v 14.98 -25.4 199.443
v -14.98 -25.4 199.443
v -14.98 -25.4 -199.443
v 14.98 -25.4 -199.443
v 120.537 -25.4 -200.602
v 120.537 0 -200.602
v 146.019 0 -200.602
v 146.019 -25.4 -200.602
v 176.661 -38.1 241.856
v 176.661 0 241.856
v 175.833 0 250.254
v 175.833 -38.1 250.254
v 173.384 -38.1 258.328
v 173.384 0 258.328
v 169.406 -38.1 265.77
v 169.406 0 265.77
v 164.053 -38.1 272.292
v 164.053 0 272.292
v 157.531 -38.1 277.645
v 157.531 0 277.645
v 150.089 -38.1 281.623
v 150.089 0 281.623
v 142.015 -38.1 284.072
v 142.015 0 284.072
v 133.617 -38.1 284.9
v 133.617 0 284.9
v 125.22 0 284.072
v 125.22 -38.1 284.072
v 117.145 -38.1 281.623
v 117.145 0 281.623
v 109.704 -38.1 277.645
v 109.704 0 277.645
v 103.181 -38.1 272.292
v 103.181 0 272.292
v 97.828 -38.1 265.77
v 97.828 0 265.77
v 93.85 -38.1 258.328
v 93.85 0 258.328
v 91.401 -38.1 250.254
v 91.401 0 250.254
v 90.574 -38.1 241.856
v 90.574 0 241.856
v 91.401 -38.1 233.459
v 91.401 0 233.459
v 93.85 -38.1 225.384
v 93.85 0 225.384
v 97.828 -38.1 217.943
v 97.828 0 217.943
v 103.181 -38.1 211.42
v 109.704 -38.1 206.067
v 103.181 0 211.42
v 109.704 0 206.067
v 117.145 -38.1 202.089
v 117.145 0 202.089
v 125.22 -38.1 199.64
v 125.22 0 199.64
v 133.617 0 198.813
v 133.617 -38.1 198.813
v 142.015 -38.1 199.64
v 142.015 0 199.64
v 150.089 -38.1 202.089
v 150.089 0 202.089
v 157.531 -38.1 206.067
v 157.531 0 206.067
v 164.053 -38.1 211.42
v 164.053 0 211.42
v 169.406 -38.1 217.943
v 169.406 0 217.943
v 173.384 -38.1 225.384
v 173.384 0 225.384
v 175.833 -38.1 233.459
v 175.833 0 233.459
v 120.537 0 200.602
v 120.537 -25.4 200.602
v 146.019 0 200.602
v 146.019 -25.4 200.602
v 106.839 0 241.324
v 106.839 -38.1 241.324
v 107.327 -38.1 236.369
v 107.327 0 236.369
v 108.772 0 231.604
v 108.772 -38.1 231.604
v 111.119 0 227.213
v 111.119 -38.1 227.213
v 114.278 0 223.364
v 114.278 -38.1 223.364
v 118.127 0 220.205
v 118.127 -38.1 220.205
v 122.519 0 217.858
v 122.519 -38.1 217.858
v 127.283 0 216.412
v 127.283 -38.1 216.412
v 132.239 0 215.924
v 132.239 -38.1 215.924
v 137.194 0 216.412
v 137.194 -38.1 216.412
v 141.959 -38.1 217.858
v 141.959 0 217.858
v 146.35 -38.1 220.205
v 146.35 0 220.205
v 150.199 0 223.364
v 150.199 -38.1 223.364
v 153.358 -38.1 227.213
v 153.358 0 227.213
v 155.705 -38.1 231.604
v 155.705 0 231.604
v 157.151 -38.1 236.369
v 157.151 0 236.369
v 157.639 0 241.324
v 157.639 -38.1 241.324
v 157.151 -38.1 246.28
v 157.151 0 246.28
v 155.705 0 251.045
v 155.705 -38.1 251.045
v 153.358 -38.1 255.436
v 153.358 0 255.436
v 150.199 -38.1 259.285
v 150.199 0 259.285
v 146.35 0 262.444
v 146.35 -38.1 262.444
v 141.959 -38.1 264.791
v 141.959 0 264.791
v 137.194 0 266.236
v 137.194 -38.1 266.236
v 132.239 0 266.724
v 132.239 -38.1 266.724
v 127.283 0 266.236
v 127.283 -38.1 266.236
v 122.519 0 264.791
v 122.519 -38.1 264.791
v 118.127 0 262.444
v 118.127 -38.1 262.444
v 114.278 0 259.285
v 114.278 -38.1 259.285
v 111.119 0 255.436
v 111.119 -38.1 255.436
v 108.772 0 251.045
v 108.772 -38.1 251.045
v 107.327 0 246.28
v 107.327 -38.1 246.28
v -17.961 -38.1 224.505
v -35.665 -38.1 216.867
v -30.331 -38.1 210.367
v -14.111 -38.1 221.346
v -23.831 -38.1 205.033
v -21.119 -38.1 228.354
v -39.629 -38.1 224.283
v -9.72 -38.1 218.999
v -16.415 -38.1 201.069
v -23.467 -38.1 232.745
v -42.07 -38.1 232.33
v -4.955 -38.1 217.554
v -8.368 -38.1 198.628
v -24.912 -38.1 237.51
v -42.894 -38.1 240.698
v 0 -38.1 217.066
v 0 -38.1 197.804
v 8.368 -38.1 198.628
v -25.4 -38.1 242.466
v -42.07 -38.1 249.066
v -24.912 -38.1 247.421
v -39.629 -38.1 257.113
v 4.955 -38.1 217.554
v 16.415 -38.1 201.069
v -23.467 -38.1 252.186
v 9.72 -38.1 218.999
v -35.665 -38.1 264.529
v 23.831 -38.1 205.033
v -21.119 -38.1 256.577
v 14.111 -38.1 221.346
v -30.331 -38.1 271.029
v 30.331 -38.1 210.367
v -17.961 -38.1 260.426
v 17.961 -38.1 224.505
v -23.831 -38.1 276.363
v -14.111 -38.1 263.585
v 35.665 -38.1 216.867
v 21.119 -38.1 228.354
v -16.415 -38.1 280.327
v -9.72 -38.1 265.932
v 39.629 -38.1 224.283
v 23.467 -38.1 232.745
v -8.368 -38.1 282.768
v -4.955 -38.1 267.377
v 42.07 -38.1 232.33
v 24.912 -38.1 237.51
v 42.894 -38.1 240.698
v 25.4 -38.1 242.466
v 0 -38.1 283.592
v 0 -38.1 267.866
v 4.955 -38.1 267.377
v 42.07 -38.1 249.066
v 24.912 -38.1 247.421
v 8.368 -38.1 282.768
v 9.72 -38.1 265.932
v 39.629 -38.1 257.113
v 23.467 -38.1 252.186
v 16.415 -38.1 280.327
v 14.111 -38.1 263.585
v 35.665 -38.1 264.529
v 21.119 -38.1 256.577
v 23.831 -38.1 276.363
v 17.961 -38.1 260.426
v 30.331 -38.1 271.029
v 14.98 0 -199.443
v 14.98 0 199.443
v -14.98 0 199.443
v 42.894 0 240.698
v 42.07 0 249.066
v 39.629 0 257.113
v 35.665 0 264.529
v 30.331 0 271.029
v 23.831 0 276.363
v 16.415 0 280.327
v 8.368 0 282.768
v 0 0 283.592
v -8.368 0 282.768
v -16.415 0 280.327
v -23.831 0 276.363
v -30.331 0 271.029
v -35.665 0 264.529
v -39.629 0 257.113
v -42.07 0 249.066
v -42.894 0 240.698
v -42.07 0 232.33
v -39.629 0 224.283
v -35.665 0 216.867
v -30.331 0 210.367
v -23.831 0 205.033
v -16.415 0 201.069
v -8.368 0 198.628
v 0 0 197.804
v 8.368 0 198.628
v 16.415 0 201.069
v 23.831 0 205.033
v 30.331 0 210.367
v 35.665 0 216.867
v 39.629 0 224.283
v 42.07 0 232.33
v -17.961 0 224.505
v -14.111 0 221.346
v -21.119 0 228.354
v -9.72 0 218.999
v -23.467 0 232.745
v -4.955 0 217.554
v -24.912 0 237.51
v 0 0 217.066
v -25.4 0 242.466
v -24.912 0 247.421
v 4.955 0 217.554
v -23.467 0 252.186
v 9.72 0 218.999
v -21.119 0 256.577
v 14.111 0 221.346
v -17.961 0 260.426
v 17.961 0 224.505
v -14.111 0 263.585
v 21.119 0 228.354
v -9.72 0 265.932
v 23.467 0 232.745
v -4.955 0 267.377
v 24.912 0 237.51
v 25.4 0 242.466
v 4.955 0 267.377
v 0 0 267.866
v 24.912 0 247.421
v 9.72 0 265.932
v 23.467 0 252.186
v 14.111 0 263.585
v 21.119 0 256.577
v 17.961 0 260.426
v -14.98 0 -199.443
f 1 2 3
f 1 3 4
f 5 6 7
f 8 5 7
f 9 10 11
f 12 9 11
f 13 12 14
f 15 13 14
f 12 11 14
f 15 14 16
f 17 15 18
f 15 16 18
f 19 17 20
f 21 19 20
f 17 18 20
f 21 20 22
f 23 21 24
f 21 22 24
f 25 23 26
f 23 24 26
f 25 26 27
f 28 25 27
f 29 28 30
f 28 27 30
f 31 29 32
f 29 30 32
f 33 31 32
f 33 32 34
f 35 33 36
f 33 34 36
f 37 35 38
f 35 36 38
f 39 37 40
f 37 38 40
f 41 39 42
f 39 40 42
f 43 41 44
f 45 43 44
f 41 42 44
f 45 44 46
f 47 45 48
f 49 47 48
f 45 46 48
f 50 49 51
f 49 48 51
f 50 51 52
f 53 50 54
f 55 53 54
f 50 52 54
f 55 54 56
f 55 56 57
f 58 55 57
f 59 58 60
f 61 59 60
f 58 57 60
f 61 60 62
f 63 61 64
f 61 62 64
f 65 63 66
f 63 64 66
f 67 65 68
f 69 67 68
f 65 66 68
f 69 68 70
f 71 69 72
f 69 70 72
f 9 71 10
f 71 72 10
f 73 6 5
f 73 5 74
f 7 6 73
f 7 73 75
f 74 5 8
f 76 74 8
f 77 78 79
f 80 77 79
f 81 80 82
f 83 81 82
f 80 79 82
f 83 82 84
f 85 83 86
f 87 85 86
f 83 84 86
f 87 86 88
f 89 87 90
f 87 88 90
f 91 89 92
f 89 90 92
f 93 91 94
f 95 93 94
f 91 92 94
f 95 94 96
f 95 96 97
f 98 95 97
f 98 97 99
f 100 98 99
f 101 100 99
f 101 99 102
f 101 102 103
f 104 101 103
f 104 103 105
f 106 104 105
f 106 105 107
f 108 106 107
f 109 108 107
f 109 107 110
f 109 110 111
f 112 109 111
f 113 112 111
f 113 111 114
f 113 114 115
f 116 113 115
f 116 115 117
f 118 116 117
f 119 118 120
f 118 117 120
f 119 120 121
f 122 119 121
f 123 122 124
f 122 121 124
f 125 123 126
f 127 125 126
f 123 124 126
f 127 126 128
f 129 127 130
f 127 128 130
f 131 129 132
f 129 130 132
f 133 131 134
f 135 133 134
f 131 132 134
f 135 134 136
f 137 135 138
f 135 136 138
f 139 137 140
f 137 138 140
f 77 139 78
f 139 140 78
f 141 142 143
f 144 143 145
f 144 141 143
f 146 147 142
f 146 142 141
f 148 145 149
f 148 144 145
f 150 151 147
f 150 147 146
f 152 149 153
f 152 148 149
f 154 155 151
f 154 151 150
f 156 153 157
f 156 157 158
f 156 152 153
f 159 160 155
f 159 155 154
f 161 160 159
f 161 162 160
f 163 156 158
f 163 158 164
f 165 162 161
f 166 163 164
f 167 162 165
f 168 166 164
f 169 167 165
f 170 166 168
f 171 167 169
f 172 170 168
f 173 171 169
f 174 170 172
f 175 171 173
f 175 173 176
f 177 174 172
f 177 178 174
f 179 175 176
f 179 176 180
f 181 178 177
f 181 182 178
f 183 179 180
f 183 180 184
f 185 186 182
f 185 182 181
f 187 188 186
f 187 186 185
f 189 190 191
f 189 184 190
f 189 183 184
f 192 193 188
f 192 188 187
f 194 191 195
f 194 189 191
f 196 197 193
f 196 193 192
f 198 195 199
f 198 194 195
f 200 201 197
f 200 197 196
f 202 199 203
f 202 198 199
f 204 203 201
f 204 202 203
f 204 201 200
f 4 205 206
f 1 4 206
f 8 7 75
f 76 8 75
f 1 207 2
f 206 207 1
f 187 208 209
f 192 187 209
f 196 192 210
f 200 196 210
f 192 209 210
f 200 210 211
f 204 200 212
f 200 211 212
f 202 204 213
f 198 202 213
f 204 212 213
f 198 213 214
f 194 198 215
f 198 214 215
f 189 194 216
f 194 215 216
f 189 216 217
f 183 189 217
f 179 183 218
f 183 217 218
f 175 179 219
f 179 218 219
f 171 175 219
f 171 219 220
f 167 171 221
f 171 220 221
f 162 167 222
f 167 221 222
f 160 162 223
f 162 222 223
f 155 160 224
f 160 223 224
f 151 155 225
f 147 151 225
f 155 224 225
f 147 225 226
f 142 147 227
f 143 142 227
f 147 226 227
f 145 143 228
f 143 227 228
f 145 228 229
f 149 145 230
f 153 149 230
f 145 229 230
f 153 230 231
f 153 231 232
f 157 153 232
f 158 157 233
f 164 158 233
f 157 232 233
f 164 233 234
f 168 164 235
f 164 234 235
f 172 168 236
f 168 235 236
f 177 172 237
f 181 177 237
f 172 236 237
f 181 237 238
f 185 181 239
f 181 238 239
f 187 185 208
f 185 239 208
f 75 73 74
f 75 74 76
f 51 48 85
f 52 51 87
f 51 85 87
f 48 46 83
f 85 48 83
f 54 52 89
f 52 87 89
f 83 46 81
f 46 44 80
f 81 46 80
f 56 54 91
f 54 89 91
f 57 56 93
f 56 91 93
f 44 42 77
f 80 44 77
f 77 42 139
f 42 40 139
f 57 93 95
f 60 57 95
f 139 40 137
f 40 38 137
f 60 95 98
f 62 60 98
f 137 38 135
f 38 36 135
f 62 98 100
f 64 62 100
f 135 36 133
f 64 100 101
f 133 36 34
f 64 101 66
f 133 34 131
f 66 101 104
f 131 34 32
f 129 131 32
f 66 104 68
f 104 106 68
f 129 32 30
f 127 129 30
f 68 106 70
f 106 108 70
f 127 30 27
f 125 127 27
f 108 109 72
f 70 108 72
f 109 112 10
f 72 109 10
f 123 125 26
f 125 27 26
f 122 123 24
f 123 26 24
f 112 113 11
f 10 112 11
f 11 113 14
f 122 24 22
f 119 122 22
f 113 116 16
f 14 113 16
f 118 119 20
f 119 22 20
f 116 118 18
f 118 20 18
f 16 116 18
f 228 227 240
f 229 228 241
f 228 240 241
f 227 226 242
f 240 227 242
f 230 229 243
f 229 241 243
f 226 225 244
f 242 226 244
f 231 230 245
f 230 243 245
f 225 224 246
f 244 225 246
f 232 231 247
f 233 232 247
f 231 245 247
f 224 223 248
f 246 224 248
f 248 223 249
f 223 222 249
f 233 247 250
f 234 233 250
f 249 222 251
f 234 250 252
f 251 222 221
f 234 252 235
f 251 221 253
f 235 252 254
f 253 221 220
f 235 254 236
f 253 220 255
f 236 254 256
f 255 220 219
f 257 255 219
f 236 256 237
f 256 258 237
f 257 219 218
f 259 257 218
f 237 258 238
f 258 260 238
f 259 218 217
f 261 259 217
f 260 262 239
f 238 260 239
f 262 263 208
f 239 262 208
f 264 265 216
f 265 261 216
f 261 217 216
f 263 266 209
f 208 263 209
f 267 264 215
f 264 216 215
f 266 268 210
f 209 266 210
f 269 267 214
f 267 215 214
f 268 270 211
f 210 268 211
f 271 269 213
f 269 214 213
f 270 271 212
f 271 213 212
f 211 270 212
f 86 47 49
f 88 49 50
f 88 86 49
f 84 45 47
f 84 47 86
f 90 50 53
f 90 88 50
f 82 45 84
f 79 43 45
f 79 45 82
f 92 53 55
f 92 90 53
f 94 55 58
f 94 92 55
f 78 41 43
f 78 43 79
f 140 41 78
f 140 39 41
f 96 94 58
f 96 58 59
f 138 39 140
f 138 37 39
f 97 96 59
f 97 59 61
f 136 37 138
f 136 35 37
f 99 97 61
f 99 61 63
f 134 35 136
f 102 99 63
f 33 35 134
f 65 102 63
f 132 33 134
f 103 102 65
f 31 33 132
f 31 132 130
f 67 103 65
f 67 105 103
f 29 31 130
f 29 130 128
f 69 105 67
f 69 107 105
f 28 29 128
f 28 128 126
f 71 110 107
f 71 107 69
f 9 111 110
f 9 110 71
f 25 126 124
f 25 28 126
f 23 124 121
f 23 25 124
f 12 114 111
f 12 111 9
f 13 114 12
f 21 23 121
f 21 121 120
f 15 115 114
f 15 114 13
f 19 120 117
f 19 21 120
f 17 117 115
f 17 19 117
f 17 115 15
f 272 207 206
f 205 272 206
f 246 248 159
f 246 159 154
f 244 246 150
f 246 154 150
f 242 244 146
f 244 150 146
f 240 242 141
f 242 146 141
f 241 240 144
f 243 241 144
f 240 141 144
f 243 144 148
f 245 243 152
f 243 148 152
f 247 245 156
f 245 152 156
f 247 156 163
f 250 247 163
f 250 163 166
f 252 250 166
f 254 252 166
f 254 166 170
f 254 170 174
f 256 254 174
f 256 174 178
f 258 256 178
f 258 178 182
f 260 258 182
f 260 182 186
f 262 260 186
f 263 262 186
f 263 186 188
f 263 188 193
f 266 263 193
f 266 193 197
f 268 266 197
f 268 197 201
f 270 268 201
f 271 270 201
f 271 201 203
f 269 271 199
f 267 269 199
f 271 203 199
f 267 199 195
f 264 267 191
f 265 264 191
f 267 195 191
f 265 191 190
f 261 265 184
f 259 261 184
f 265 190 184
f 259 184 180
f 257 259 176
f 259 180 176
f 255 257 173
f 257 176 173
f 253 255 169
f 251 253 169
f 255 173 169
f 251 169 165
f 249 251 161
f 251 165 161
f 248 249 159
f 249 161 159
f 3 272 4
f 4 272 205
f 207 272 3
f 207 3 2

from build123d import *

# Parameters (mm, degrees)
F0_W     = 29.9609806389
F0_H     = 398.8869190216
F1_DEPTH = 25.4
F0_W_2   = 25.4818499088
F0_H_2   = 401.2034833431
F2_R     = 43.043289281
F3_DEPTH = 38.1
F2_R_2   = 42.8944025652
F5_D     = 50.8
F5_2_D   = 50.8


with BuildPart() as f1:
    # F0 (on Front) → F1 (new body)
    with BuildSketch(Plane.XZ):
        Rectangle(F0_W, F0_H)
    extrude(amount=F1_DEPTH)


with BuildPart() as f1b:
    # F0 (on Front) → F1, piece 2 (new body)
    with BuildSketch(Plane.XZ):
        with Locations((133.2776546478, 0)):
            Rectangle(F0_W_2, F0_H_2)
    extrude(amount=F1_DEPTH)


with BuildPart() as f3:
    # F2 (on Front) → F3 (new body)
    with BuildSketch(Plane.XZ):
        with Locations((133.6172372103, 241.8562173843)):
            Circle(F2_R)
    extrude(amount=F3_DEPTH)

    # F5 (through all)
    with Locations(Plane(origin=(0, 0, 0), x_dir=(1, 0, 0), z_dir=(0, 1, 0))):
        with Locations((0, -242.4655109644), (132.2387903929, -241.3244098425)):
            Hole(F5_D / 2)


with BuildPart() as f3b:
    # F2 (on Front) → F3, piece 2 (new body)
    with BuildSketch(Plane.XZ):
        with Locations((0, 240.6979352236)):
            Circle(F2_R_2)
    extrude(amount=F3_DEPTH)

    # F5#2 (through all)
    with Locations(Plane(origin=(0, 0, 0), x_dir=(1, 0, 0), z_dir=(0, 1, 0))):
        with Locations((0, -242.4655109644), (132.2387903929, -241.3244098425)):
            Hole(F5_2_D / 2)


solid = Compound([f1.part, f1b.part, f3.part, f3b.part])
